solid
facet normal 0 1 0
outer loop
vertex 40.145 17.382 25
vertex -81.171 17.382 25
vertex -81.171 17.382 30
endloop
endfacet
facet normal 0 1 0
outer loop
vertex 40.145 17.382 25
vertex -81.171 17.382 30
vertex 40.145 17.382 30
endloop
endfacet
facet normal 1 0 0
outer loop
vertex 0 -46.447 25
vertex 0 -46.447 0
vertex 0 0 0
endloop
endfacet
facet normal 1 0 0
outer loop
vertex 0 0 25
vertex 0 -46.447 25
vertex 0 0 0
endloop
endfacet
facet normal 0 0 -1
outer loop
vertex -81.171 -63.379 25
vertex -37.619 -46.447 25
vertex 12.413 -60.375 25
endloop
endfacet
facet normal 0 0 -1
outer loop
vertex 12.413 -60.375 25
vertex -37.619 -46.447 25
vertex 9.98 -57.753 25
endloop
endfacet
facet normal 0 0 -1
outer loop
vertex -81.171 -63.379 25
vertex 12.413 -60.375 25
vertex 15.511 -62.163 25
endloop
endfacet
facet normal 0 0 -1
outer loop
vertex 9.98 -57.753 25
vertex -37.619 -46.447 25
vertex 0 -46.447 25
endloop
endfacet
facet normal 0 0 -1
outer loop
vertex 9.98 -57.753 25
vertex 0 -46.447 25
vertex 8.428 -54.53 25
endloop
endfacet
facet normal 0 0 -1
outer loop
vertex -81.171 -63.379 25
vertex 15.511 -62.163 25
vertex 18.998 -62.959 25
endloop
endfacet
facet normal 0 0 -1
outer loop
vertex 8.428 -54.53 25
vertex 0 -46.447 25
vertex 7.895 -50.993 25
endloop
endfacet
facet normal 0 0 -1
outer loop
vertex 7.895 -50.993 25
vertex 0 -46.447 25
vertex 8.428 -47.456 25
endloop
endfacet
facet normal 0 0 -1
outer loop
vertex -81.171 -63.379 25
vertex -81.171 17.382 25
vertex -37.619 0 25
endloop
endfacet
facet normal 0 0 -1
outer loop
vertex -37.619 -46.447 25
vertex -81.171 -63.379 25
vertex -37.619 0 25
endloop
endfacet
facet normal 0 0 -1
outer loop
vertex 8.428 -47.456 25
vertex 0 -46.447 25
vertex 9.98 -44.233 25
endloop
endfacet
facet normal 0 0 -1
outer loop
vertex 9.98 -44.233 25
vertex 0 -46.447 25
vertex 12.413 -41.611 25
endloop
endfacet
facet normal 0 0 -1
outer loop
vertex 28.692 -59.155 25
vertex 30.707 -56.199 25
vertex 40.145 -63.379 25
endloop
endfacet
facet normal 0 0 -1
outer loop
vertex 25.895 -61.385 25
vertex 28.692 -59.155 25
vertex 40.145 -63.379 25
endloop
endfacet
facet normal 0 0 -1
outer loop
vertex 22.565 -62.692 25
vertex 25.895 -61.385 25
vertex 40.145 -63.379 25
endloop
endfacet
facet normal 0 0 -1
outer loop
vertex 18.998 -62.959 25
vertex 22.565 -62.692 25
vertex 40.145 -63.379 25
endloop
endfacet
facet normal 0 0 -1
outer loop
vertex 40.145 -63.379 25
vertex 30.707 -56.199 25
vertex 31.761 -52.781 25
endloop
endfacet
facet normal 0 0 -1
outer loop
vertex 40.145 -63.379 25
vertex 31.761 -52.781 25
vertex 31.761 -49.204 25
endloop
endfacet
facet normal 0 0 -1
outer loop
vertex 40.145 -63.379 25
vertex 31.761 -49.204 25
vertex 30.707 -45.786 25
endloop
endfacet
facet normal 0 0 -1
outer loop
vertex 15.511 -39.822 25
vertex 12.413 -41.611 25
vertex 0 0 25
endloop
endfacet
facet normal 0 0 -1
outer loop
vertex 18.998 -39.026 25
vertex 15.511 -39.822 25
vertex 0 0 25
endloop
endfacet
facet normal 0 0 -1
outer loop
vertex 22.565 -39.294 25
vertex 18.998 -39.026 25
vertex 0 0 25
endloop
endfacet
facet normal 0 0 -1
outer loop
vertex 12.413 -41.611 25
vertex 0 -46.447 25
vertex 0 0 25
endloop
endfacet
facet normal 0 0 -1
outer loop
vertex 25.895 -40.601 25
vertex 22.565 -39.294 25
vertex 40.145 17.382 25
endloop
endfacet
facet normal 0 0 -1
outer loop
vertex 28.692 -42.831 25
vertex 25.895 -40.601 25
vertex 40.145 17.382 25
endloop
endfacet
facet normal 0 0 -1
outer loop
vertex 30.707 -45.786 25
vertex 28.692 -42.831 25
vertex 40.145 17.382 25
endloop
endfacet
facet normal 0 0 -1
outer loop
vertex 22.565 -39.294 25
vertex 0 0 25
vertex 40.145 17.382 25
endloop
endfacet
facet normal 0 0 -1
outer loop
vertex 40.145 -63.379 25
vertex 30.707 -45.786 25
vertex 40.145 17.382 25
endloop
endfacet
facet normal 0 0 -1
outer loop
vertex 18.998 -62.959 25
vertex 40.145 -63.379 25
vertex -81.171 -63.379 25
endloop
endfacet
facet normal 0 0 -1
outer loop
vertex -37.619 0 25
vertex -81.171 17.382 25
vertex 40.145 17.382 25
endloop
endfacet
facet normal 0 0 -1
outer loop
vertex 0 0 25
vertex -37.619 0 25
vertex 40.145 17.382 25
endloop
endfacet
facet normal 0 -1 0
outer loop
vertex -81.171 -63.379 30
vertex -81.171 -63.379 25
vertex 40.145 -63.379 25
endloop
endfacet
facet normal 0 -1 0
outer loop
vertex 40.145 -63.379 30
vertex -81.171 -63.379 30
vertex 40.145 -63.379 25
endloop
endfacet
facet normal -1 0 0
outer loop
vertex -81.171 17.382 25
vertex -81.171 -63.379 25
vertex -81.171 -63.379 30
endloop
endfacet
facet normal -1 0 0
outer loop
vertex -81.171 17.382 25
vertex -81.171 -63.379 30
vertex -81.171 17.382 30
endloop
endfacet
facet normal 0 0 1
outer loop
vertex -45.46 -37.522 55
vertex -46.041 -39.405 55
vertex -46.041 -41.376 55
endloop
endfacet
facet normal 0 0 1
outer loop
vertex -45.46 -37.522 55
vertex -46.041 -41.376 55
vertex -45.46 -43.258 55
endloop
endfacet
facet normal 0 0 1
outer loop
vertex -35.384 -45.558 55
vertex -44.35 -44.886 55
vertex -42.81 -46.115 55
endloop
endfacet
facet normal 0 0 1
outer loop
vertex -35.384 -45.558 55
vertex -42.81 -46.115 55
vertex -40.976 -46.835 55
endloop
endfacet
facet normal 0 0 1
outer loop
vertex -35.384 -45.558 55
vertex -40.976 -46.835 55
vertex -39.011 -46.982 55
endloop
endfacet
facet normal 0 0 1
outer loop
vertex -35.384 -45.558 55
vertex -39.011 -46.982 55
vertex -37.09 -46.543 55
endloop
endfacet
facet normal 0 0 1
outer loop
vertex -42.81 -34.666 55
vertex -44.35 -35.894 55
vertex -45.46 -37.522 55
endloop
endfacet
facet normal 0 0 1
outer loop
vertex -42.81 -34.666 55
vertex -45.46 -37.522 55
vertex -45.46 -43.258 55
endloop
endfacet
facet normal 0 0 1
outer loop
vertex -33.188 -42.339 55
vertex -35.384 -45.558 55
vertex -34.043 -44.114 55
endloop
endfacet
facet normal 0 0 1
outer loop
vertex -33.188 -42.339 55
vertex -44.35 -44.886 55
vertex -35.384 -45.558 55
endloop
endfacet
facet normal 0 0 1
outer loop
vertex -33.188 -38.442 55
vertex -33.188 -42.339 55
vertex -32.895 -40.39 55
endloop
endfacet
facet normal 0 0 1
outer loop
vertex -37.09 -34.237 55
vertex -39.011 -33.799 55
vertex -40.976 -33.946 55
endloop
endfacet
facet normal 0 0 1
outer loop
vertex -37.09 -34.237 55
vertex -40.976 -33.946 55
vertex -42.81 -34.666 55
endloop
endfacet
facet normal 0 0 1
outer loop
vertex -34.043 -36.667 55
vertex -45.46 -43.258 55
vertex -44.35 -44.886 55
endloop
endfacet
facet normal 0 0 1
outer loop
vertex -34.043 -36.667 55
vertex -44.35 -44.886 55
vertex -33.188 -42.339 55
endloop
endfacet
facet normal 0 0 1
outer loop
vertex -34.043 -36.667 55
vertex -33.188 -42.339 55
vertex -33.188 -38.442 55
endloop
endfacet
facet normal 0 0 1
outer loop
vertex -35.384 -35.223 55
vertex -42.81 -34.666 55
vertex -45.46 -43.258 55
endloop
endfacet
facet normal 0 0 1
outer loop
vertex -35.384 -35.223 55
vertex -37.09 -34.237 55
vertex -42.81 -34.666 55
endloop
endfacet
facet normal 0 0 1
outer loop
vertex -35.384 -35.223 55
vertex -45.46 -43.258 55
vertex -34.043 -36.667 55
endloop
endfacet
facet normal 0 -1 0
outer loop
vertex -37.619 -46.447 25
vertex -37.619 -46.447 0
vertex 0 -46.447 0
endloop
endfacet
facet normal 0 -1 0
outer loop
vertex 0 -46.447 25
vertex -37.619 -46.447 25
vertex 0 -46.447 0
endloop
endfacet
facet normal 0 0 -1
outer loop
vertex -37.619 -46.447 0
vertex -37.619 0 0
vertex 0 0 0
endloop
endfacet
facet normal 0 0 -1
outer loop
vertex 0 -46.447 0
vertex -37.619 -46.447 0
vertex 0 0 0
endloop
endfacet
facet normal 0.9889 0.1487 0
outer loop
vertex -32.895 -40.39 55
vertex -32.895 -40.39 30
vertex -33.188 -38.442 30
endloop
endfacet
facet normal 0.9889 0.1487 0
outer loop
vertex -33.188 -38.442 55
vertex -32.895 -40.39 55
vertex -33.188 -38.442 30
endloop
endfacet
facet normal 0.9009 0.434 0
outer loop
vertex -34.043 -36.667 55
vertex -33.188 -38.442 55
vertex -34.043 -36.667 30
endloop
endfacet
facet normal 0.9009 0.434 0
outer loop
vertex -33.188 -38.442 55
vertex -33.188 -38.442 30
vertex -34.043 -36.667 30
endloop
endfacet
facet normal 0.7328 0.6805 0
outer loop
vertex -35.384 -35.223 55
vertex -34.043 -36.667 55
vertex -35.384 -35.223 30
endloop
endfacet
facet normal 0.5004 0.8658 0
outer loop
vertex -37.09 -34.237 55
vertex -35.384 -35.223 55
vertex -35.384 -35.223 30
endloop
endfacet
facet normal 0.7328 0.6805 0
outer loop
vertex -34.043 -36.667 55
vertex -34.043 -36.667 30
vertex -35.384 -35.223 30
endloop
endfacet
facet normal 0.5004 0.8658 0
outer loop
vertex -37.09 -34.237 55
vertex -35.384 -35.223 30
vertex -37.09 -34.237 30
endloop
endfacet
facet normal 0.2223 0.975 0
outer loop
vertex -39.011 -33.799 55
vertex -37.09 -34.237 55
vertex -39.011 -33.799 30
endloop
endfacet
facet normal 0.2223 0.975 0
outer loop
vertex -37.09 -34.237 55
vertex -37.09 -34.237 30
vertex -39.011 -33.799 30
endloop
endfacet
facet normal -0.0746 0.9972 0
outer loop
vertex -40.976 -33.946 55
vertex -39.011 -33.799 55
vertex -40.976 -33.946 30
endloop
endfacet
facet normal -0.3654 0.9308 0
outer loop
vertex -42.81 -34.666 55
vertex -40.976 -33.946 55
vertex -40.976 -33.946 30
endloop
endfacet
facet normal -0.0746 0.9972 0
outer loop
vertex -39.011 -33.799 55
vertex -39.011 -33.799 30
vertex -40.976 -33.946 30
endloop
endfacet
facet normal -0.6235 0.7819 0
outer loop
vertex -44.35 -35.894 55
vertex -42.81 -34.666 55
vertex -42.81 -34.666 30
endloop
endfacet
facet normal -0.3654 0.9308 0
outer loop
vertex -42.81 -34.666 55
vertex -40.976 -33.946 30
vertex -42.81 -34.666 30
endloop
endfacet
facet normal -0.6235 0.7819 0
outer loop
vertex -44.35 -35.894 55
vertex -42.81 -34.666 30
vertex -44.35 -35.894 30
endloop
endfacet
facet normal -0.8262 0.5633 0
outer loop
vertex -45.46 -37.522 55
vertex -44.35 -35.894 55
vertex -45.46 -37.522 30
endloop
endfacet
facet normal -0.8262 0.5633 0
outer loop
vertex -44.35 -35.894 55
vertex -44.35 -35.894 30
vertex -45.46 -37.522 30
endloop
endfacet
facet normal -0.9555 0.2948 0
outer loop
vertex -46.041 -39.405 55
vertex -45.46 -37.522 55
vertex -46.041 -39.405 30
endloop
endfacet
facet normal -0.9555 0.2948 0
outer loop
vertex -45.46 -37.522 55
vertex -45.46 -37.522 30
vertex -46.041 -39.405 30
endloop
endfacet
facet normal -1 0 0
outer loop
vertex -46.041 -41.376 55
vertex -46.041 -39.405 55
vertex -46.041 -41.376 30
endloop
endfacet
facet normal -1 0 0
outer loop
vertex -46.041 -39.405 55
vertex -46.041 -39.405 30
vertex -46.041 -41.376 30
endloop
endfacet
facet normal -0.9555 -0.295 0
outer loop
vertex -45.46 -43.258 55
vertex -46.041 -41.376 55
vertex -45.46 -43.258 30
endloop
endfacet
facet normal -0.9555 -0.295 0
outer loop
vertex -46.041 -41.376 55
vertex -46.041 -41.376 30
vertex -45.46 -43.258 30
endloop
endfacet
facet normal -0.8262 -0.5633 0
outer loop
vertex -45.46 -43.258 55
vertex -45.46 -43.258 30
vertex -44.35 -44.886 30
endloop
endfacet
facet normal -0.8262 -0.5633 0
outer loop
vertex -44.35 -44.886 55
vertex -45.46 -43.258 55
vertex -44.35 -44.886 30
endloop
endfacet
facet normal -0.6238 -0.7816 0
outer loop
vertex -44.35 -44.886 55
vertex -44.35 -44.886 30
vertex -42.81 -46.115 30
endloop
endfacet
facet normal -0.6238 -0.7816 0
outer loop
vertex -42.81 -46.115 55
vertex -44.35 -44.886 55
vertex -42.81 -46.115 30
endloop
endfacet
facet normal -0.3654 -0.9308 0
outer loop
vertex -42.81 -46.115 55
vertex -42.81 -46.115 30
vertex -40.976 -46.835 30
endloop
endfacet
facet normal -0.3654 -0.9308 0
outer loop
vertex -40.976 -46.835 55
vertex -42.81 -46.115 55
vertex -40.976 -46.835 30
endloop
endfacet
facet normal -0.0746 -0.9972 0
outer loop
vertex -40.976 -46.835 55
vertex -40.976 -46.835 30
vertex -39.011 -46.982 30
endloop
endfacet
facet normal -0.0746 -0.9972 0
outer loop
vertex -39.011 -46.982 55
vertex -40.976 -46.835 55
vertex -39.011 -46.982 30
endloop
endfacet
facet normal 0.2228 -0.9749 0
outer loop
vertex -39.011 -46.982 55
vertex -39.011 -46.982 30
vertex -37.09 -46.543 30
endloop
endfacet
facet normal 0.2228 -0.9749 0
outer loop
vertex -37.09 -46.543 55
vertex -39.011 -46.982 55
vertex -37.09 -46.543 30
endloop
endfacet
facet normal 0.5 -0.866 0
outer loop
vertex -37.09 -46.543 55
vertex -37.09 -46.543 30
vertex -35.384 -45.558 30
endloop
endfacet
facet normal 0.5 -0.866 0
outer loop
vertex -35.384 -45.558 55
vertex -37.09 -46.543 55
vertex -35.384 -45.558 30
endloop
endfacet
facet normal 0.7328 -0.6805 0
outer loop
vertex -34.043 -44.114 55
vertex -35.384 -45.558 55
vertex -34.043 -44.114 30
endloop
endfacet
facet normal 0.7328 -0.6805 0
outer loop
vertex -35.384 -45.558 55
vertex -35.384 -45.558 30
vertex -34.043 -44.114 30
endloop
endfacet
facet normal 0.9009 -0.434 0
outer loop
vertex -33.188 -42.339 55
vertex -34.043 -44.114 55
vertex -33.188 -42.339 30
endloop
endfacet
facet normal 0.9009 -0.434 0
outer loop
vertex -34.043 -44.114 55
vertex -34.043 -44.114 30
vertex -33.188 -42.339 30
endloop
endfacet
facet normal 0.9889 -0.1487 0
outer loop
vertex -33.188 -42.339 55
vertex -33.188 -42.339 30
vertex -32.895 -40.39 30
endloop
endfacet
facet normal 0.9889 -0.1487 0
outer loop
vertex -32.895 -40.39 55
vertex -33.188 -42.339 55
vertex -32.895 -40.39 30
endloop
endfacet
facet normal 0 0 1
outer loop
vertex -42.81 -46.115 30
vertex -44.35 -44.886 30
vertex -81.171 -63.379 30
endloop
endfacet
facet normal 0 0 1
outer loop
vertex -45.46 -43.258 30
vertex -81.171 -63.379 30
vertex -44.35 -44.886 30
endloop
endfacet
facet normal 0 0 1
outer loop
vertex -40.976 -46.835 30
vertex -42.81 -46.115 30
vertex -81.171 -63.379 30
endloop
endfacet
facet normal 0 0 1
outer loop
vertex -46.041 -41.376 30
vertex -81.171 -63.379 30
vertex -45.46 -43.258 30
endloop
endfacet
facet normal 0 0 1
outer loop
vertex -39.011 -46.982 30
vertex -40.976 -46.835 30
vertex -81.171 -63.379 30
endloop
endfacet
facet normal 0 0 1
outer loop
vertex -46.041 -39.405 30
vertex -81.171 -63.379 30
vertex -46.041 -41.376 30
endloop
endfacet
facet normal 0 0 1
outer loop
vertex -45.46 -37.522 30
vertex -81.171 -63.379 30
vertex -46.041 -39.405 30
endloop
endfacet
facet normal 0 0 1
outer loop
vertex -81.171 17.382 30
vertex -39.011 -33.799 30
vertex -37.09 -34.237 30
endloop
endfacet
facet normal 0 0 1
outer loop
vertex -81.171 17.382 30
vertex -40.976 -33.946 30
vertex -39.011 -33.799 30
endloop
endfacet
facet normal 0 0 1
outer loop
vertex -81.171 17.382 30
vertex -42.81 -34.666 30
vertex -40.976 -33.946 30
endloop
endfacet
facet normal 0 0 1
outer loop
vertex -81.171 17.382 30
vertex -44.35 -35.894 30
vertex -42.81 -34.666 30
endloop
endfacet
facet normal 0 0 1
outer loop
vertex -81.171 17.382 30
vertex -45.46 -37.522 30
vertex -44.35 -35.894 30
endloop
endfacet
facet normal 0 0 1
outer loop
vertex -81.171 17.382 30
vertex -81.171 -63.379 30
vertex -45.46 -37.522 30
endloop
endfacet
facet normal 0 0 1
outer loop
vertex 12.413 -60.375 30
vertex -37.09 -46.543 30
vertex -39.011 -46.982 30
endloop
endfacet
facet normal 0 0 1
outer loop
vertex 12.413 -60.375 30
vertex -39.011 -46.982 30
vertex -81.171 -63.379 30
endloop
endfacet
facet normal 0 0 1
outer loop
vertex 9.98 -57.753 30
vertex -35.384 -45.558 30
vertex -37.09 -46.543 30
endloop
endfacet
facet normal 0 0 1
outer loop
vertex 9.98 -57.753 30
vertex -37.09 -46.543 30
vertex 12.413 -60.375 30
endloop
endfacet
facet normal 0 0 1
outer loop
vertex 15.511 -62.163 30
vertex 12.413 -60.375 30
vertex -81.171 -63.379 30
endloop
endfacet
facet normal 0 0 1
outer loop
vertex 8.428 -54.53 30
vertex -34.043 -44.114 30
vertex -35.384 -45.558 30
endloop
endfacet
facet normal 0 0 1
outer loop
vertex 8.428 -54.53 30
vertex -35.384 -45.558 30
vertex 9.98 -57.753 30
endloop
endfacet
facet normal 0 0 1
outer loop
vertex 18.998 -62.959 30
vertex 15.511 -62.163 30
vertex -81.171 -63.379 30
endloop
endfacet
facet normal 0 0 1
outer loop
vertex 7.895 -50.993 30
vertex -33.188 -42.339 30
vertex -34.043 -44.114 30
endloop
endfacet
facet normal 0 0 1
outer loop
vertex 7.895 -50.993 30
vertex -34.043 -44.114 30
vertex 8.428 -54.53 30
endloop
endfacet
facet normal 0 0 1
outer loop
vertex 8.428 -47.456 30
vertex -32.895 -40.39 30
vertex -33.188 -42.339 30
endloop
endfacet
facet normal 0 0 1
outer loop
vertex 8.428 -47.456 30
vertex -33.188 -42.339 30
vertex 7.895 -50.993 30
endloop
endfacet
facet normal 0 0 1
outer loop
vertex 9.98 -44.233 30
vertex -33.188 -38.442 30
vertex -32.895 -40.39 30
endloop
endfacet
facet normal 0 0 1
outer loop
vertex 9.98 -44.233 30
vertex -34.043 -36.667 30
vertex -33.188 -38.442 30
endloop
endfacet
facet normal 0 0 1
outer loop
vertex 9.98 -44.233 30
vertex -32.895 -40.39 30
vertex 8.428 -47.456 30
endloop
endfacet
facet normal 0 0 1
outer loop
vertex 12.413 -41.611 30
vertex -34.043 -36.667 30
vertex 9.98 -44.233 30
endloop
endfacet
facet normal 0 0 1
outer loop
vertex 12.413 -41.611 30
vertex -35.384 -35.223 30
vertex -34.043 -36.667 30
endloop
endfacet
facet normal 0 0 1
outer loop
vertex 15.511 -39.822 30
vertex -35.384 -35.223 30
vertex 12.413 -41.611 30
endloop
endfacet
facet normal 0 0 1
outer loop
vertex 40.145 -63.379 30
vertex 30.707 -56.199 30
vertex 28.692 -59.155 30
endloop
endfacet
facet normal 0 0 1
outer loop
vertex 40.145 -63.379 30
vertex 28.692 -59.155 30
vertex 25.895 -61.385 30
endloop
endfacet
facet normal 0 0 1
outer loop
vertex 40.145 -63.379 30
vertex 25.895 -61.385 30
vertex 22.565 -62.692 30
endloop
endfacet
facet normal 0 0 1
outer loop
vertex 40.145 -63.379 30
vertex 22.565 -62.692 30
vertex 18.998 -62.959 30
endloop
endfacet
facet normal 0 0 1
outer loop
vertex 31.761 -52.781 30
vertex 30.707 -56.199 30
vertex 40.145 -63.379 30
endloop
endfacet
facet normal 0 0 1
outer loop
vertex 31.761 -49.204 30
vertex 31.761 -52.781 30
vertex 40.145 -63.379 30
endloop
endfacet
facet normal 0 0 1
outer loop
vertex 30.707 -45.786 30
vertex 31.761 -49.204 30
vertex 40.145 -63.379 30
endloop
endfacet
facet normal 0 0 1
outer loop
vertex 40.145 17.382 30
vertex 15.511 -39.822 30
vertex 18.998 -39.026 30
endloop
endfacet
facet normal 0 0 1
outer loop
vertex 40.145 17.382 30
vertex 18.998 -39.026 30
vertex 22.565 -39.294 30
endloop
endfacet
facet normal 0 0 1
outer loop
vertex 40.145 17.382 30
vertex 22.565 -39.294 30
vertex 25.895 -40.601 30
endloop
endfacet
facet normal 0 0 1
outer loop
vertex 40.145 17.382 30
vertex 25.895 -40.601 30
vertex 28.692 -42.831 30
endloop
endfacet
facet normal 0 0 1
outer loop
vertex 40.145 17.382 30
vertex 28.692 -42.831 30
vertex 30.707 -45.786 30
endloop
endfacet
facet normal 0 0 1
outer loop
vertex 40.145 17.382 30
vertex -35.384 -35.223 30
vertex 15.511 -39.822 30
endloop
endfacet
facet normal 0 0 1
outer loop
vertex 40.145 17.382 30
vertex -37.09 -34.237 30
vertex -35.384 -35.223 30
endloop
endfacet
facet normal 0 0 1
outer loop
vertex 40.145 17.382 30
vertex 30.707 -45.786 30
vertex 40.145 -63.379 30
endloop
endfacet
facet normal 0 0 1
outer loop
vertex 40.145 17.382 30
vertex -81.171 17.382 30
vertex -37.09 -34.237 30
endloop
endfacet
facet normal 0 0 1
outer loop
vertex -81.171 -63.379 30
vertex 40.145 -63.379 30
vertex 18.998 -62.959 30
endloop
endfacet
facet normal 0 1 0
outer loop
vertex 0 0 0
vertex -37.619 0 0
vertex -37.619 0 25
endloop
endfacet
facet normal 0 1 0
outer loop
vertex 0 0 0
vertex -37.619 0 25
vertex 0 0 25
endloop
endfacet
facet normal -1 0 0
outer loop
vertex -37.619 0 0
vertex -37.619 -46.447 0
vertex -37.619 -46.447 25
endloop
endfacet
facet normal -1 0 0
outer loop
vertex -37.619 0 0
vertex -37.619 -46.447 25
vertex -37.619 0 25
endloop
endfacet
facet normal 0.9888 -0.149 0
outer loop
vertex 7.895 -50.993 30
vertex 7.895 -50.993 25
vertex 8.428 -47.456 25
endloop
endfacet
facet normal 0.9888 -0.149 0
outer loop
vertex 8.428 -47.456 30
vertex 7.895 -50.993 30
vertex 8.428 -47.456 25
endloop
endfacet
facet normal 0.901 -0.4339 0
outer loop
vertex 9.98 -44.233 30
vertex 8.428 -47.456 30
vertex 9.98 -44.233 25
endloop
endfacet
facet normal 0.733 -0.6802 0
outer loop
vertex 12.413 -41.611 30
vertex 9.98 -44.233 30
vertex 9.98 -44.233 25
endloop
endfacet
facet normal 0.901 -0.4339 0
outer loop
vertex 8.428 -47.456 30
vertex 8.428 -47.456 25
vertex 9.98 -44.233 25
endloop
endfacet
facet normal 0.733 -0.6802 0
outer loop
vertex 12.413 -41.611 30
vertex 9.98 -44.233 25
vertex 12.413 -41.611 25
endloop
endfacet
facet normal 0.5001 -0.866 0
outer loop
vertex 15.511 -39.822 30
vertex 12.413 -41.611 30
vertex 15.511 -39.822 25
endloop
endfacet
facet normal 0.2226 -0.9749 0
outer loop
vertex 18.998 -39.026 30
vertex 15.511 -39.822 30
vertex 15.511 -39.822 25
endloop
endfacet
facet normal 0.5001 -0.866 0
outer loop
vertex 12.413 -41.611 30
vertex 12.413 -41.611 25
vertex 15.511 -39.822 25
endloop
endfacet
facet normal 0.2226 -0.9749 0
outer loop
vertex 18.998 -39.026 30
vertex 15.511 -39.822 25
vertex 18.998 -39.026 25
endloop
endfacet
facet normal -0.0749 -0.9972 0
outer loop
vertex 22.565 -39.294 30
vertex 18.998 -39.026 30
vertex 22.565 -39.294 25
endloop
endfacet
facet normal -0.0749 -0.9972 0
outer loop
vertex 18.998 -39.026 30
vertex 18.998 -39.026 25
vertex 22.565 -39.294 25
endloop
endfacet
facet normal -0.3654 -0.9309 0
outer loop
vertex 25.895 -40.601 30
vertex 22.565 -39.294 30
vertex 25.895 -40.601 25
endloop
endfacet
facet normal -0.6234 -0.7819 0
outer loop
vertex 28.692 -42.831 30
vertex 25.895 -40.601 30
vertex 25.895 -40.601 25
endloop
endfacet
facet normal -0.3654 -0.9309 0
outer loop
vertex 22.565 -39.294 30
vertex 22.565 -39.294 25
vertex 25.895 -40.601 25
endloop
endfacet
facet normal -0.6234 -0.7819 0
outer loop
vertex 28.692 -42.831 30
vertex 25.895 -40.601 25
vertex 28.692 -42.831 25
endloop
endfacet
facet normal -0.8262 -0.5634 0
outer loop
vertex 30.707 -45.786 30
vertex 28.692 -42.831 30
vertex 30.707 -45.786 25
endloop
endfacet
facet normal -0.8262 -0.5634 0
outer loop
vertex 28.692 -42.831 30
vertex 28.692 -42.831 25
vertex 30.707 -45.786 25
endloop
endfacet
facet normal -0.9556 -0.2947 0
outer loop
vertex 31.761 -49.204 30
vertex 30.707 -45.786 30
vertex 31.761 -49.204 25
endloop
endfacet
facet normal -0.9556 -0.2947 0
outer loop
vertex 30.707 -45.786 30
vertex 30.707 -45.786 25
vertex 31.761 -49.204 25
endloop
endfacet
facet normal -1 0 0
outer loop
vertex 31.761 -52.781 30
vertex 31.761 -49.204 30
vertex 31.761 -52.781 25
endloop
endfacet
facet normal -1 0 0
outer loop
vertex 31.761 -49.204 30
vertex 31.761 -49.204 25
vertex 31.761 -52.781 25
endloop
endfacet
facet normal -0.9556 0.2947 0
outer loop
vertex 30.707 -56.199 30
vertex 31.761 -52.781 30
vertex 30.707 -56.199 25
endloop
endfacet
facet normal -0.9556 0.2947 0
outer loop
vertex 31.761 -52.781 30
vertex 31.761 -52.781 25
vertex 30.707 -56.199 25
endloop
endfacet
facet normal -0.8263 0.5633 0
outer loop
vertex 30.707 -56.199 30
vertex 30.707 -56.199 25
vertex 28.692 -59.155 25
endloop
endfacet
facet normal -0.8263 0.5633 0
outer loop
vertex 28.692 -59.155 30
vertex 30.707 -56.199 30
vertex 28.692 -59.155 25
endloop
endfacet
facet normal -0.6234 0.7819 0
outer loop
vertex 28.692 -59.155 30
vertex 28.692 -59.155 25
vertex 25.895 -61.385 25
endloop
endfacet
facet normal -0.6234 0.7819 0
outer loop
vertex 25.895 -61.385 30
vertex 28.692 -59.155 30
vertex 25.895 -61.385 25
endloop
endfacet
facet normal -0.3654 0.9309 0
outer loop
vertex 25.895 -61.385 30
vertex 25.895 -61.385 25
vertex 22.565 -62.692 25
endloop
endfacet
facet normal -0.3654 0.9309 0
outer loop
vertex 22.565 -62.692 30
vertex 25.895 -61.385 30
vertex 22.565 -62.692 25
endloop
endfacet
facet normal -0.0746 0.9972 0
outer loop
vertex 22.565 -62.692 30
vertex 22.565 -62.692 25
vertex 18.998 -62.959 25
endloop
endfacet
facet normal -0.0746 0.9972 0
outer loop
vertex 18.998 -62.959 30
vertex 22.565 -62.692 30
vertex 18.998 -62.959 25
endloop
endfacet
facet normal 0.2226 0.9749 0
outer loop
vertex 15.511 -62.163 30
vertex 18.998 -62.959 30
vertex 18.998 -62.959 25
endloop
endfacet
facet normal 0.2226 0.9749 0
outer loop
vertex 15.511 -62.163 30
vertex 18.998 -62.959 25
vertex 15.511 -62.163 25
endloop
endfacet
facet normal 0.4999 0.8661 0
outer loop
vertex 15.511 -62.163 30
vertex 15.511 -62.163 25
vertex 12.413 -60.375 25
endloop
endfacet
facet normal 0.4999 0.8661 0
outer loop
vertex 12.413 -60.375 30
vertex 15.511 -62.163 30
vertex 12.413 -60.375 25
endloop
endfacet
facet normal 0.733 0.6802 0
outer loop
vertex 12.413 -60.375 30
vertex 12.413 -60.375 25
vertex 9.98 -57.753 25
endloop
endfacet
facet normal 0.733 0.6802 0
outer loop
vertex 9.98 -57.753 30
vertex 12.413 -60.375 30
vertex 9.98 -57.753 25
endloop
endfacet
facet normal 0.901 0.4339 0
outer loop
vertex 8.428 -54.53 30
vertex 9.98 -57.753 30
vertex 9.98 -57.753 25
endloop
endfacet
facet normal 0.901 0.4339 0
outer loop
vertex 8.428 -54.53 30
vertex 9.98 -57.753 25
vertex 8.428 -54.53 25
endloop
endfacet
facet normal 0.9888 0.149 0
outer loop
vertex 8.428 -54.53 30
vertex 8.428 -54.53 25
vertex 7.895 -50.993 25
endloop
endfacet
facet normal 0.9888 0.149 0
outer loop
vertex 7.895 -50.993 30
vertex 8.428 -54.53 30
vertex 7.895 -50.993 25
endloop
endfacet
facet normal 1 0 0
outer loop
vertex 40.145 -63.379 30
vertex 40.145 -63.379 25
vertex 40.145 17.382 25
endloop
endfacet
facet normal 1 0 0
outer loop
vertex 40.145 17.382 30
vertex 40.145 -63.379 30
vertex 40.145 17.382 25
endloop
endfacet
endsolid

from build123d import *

# Parameters (mm, degrees)
F0_W     = 37.619051
F0_H     = 46.446688
F1_DEPTH = 25
F2_W     = 121.315539
F2_H     = 80.761321
F3_DEPTH = 5
F4_R     = 6.609922
F5_DEPTH = 25
F7_D     = 24


with BuildPart() as f1:
    # F0 (on Top) → F1 (new body)
    with BuildSketch(Plane.XY):
        with Locations((-18.809525, -23.223344)):
            Rectangle(F0_W, F0_H)
    extrude(amount=F1_DEPTH)

    # F2 (on face) → F3 (join)
    with BuildSketch(Plane.XY.offset(25)):
        with Locations((-20.51305, -22.998762)):
            Rectangle(F2_W, F2_H)
    extrude(amount=F3_DEPTH)

    # F4 (on face) → F5 (join)
    with BuildSketch(Plane.XY.offset(30)):
        with Locations((-39.504733, -40.390346)):
            Circle(F4_R)
    extrude(amount=F5_DEPTH)

    # F7 (through all)
    with Locations(Plane.XY.offset(30)):
        with Locations((19.895032, -50.992895)):
            Hole(F7_D / 2)


solid = f1.part
